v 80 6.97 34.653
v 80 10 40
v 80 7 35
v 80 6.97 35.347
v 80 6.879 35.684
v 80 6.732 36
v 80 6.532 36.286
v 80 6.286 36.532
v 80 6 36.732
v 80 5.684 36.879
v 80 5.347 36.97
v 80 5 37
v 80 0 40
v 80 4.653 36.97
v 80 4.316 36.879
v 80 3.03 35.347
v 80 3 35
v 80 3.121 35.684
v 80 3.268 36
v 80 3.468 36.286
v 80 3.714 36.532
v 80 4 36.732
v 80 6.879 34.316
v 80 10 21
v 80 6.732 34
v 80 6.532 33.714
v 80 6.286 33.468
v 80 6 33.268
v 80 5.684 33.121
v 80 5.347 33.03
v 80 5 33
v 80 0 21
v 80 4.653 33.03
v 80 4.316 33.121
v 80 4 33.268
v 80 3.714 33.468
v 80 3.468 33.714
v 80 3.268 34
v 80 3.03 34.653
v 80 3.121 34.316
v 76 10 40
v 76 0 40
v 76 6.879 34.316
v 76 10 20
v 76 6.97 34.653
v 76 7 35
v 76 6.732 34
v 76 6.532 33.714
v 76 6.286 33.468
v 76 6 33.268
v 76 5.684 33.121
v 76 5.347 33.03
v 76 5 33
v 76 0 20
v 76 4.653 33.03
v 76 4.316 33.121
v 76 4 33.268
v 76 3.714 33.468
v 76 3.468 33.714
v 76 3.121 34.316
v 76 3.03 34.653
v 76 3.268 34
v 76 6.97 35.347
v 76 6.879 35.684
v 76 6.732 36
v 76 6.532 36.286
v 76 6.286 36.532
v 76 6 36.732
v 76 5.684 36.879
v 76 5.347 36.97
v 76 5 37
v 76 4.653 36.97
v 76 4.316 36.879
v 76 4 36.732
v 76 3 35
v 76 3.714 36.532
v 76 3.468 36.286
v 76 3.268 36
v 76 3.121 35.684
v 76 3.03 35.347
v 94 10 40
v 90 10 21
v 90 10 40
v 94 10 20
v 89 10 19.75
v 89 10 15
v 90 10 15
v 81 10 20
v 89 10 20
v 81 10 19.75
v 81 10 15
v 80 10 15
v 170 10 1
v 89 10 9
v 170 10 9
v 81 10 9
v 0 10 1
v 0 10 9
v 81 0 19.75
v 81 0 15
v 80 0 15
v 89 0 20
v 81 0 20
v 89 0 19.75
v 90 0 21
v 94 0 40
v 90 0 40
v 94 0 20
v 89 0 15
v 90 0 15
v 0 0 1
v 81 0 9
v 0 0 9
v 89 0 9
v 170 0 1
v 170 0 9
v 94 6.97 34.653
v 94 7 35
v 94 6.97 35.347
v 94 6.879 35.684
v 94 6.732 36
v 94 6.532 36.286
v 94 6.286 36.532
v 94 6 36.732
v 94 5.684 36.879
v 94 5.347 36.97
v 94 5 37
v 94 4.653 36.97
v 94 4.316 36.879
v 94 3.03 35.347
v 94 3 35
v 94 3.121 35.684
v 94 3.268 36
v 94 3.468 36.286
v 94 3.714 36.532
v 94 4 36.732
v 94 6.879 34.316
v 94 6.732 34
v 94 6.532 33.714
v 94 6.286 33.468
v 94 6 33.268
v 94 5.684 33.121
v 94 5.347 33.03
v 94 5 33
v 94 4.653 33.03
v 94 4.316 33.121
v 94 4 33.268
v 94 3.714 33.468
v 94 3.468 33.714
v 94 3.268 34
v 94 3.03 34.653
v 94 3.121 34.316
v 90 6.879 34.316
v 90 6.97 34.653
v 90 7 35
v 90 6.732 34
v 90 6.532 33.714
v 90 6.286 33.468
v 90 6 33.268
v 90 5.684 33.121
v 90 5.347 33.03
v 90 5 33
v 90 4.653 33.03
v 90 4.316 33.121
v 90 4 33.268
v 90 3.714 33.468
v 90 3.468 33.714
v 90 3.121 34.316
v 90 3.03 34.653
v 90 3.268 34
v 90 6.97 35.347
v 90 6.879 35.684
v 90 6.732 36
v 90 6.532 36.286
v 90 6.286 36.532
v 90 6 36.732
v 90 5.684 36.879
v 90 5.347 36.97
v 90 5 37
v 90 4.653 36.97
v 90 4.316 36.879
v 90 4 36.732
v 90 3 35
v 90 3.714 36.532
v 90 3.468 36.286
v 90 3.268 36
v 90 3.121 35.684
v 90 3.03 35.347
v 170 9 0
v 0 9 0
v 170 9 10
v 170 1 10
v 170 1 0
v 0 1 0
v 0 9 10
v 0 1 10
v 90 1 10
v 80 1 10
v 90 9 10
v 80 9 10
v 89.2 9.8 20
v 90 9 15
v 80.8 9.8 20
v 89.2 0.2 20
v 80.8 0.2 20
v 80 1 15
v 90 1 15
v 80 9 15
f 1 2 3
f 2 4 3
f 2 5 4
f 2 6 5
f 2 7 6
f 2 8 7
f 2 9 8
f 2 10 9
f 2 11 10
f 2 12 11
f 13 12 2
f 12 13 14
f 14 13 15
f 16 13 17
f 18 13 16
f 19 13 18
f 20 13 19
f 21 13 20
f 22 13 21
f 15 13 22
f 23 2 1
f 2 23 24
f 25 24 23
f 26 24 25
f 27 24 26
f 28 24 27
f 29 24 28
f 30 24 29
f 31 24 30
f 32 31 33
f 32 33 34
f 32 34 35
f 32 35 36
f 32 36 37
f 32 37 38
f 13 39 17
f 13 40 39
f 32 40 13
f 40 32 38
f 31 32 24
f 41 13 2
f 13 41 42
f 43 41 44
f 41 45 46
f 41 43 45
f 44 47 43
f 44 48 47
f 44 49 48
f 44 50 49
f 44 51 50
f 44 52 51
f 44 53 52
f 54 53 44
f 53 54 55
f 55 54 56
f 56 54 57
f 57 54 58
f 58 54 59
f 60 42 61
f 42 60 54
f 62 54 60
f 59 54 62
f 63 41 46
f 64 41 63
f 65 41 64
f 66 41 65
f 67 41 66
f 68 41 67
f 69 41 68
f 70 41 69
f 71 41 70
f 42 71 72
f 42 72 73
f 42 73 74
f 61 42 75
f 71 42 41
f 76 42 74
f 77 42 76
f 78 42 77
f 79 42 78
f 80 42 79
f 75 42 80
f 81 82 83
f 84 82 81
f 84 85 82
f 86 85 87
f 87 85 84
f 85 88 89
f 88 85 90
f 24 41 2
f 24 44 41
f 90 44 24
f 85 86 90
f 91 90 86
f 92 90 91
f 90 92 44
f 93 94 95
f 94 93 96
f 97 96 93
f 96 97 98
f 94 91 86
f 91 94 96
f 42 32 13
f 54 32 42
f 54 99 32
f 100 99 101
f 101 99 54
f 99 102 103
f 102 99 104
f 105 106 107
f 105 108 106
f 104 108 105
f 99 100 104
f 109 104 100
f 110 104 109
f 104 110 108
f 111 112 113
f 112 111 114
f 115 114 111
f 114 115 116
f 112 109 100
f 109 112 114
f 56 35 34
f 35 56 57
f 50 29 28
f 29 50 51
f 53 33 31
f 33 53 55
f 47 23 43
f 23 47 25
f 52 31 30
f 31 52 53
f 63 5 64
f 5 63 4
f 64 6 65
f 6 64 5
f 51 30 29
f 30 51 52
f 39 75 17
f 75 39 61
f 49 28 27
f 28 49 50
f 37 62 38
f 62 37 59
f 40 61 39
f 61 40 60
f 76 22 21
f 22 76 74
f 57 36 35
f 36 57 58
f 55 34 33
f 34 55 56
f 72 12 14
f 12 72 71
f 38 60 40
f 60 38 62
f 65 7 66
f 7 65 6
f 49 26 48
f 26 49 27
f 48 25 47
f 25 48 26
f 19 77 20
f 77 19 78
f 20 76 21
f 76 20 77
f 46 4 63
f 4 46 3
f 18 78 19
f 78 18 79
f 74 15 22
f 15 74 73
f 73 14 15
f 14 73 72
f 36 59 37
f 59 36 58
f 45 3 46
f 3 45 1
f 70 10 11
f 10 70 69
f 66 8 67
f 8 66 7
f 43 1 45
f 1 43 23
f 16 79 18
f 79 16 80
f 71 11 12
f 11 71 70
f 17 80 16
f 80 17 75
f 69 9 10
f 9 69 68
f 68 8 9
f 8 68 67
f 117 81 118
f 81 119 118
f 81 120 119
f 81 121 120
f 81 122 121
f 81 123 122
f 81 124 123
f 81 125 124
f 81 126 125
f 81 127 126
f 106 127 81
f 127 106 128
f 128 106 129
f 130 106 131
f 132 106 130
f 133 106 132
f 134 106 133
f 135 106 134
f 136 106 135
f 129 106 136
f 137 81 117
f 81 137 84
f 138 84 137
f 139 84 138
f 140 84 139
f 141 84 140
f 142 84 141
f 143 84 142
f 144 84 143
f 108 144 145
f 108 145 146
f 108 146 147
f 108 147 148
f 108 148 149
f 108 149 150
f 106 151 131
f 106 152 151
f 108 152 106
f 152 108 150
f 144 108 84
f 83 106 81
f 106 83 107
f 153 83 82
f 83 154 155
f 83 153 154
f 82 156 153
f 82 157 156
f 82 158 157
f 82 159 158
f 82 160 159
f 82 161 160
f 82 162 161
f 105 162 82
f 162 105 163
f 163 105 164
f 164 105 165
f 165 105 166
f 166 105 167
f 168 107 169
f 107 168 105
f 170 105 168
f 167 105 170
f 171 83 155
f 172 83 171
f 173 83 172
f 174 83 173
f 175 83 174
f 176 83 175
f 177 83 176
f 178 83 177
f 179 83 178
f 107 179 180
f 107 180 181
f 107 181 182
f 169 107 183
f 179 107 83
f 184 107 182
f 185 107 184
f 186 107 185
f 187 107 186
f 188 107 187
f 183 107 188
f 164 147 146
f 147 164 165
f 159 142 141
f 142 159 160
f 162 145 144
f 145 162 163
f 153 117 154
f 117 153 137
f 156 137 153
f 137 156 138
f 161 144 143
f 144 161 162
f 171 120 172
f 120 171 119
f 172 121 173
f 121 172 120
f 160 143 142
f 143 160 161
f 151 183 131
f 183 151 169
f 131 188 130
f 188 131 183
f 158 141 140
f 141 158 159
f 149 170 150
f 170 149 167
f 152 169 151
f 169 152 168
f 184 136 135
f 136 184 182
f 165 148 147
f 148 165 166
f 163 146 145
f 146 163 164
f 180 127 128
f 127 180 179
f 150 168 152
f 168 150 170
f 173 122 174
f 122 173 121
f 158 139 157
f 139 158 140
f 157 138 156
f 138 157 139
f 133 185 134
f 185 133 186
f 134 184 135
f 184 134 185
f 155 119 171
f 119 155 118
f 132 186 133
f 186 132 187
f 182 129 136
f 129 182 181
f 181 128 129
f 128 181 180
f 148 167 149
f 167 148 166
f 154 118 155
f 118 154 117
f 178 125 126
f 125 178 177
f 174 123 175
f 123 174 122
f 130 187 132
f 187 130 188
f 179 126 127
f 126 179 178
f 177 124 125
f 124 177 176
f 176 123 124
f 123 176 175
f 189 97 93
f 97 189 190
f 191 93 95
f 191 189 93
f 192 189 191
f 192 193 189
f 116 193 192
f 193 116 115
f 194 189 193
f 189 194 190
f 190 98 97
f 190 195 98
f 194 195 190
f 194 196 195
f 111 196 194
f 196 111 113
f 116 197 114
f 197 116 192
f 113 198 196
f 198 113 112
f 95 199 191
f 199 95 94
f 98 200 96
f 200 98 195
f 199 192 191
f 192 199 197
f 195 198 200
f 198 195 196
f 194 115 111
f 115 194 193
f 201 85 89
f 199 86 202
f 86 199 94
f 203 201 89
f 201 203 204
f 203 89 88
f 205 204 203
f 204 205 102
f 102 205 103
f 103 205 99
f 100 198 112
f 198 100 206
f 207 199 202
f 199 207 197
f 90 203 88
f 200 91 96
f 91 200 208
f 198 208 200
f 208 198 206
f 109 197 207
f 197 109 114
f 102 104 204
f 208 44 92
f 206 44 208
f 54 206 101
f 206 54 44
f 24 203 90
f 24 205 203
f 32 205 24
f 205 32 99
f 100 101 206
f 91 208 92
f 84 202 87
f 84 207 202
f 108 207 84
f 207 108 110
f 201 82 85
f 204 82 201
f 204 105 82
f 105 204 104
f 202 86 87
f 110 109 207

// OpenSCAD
//PCB vice V1.0
//a simple slide that can be attatched to the head of an articulated lamp


ds = 4; //screw cutout diameter

module extrude(x) //extrusion
{
    linear_extrude(x)
    {
            offset(1)
            {
                square(8, center = true);
            }
    }
}

union()
{
    translate([0,5,5]) rotate([0, 90, 0]) extrude(170); //slide itself

    translate([85, 5, 9]) rotate([0, 0, 0]) extrude(11); //shaft mount piece

    difference()
    {
        translate([76, 0, 20]) cube([4, 10, 20]); //left mount piece 
        translate([76, 5, 35]) rotate([0, 90, 0]) cylinder(d = ds, h = 5, $fn = 36); //screw cutout
    }
    difference()
    {
    translate([90, 0, 20]) cube([4, 10, 20]); //right mount piece 
    translate([90, 5, 35]) rotate([0, 90, 0]) cylinder(d = ds, h = 5, $fn = 36); //screw cutout
    }

    hull() //left mount hull
    {
        translate([80, 0, 15]) cube([4, 10, 1]); //left mount piece base hull
        translate([76, 0, 20]) cube([4, 10, 1]); //left mount piece hull
    }

    hull() //right mount hull
    {
        translate([90, 0, 20]) cube([4, 10, 1]); //right mount piece hull
        translate([86, 0, 15]) cube([4, 10, 1]); //right mount piece base hull
    }
}
